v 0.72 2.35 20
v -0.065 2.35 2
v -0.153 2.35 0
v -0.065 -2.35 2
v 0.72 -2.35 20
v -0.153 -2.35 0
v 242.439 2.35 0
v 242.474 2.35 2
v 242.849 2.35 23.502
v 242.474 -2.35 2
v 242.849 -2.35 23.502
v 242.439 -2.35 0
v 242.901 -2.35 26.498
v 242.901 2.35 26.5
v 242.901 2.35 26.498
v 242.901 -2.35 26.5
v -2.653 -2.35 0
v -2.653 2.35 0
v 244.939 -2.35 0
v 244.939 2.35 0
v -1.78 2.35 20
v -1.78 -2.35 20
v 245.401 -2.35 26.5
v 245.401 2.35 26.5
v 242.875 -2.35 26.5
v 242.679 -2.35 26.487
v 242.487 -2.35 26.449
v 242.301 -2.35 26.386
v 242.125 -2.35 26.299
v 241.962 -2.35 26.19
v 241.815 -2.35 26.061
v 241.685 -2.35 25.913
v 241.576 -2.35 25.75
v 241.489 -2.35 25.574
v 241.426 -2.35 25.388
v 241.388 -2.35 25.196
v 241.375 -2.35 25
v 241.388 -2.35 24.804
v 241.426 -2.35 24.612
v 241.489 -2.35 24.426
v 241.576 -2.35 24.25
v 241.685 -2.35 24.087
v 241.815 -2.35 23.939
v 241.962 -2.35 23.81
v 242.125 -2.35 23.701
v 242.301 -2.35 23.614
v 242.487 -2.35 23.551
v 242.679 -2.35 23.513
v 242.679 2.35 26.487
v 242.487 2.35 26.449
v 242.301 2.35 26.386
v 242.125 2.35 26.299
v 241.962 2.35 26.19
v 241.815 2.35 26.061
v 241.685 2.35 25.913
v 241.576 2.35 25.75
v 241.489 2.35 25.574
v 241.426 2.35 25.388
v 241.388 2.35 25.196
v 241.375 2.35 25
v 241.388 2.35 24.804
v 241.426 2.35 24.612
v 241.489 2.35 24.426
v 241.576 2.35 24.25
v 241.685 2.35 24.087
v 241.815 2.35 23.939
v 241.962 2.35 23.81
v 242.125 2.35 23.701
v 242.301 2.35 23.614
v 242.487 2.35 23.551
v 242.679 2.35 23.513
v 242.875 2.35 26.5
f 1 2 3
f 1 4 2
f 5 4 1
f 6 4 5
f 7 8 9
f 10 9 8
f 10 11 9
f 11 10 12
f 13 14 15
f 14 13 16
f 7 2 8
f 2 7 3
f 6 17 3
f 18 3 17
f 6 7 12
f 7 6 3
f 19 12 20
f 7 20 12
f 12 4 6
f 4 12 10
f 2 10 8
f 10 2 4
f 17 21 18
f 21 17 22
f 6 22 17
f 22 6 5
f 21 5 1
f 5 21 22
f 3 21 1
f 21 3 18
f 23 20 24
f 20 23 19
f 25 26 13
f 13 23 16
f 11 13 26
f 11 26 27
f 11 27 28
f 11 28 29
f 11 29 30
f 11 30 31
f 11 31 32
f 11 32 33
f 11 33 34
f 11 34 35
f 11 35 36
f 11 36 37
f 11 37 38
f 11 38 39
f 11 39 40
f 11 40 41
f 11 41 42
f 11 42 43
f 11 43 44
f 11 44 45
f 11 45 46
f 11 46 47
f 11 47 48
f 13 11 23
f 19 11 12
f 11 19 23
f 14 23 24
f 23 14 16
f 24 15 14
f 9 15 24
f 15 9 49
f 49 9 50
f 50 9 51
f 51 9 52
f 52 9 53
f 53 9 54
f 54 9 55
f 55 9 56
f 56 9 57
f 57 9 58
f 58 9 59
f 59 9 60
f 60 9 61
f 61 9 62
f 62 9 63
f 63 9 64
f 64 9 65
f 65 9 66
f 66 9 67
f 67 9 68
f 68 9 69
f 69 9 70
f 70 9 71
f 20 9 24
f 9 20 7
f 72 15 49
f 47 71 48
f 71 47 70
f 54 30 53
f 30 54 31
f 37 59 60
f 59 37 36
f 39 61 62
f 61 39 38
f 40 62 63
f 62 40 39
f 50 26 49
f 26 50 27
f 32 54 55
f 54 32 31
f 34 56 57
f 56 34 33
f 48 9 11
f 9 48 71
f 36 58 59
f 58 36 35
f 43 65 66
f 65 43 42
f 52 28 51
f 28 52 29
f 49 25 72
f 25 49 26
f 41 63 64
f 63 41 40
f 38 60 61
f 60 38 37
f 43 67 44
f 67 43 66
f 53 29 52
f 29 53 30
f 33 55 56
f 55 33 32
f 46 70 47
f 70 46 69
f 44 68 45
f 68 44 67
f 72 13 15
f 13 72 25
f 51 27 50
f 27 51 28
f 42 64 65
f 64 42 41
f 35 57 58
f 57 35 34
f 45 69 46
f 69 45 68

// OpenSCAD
// Dozuki saw tooth cover: U-channel that presses onto the toothed edge from the side,
// capped at both ends. Inside: a wider channel at the bottom for the set teeth,
// and a thin slot above it that grips the blade body.
// The end caps lean to match the blade's end edges (/__/).
// Print on its closed bottom edge, opening up - no supports or bridges.

edge_len    = 241.5;   // blade's full bottom length, including the end diagonals
end_rise    = 1.5;     // the diagonals at each end of the edge rise this much
heel_lean   = 2.5;     // lean of the heel end edge, degrees from vertical - smaller is steeper
toe_lean    = 1;       // lean of the toe end edge, steeper than the heel (both lean the same way, /__/)
end_clear   = 0.5;     // gap between each blade end and its end cap
cover_h     = 18;      // MEASURE: how far up the blade it reaches (less than tooth tips to spine)
blade_t     = 0.3;     // blade body thickness
kerf        = 0.9;     // MEASURE: thickness across the set teeth
tooth_h     = 2;       // MEASURE: tooth height

body_gap    = 0.15;    // slot clearance on the blade body (small = more friction)
teeth_gap   = 0.6;     // clearance on the teeth
floor_t     = 2;       // wall under the tooth tips
wall        = 1.6;     // side wall thickness
end_wall    = 2.5;     // end caps at the heel and toe
end_caps    = true;    // false to see the profile from the end - set true before printing
tall_cap    = "toe";   // which end cap reaches further up the blade: "toe" or "heel"
tall_cap_h  = 21.5;    // how far up the blade the tall cap covers, from the cutting edge
hook_nub_r  = 1.5;     // MEASURE: rounded nub on top of the tall cap (above tall_cap_h), hooks
                       // into the notch in the blade's end edge - this is how far it sticks in
cutaway     = false;   // view only: one side wall removed - set false before printing

// blade mockup (view only - set show_blade false before exporting)
show_blade  = false;
heel_run    = 8;       // diagonal length at the heel end (x = 0 side), part of edge_len
toe_run     = 3;       // diagonal length at the toe end, part of edge_len
mock_h      = 45;      // MEASURE: blade height to draw

lead_in     = 0.8;     // chamfer on the slot lips so it pushes on easier
pinch_gap   = 0.2;     // gap between the pinch nubs: about the smallest a 0.4mm nozzle keeps
                       // open, and still under the blade so they grip it
pinch_h     = 1.2;     // height of the pinch nubs
pinch_land  = 0.4;     // flat on the nub tips - a sharp point is thinner than the nozzle
                       // line, so the slicer would drop it and leave a bigger gap

blade_len  = edge_len + 2*end_clear;   // inside length, measured where the blade's corners are
body_slot  = blade_t + body_gap;
teeth_slot = kerf + teeth_gap;
width      = teeth_slot + 2*wall;
height     = floor_t + cover_h;

// cross-section: x across the blade, y up from the bottom edge
module profile() {
    difference() {
        translate([-width/2, 0]) square([width, height]);
        translate([-teeth_slot/2, floor_t]) square([teeth_slot, tooth_h + 1]);
        translate([-body_slot/2, floor_t]) square([body_slot, cover_h + 1]);
        polygon([[-body_slot/2, height - 2], [-body_slot/2 - lead_in, height + 0.01],
                 [ body_slot/2 + lead_in, height + 0.01], [ body_slot/2, height - 2]]);
        // view only: drop the +x side wall to look inside
        if (cutaway) translate([body_slot/2 + 0.01, -1]) square([width, height + 2]);
    }
    // >< pinch nubs just under the chamfer, pointing in from both walls
    y0 = height - 2;
    for (s = [-1, 1])
        polygon([[s * (body_slot/2 + 0.01), y0],
                 [s * pinch_gap/2, y0 - (pinch_h - pinch_land)/2],
                 [s * pinch_gap/2, y0 - (pinch_h + pinch_land)/2],
                 [s * (body_slot/2 + 0.01), y0 - pinch_h]]);
}

// blade side view: x along the blade from its heel corner, y up from the cutting edge
module blade_outline() {
    rise = mock_h - end_rise;
    polygon([[heel_run, 0], [edge_len - toe_run, 0],
             [edge_len, end_rise], [edge_len + rise * tan(toe_lean), mock_h],
             [rise * tan(heel_lean), mock_h], [0, end_rise]]);
}

// blade standing in the slot, tooth edge on the floor, centred along the cover
if (show_blade)
    color("silver", 0.6)
        translate([(blade_len - edge_len) / 2, 0, floor_t])
            rotate([90, 0, 0]) linear_extrude(height = blade_t, center = true) blade_outline();

// --- cover, built in its own frame: x across, y up, z along the length ---

// lean a shape along the length by angle a, pivoting at the height of the blade's
// corners so the caps sit end_clear from them
module lean(a) {
    k = tan(a);
    y_ref = floor_t + end_rise;
    multmatrix([[1, 0, 0, 0], [0, 1, 0, 0], [0, k, 1, -k * y_ref]]) children();
}

// slab between a face at z0 leaning a0 and a face at z1 leaning a1,
// oversized across and up so it only trims the length
module span(z0, a0, z1, a1) {
    big = 1000;
    intersection() {
        lean(a0) translate([-width, -1, z0])       cube([2*width, big, big]);
        lean(a1) translate([-width, -1, z1 - big]) cube([2*width, big, big]);
    }
}

// channel profile run well past both ends, trimmed to length by span()
module run(z0, a0, z1, a1) {
    intersection() {
        translate([0, 0, -end_wall - 10]) linear_extrude(height = blade_len + 2*end_wall + 20)
            children();
        span(z0, a0, z1, a1);
    }
}

module floor_band() { translate([-width, -1]) square([2*width, floor_t + 1]); }

// length along x, opening facing up
rotate([90, 0, 90]) {
    // walls, then the floor under the teeth (red, preview only)
    run(0, heel_lean, blade_len, toe_lean) difference() { profile(); floor_band(); }
    run(0, heel_lean, blade_len, toe_lean) intersection() { profile(); floor_band(); }
    // end caps: full solid section, each leaning with its blade end edge
    tall = floor_t + tall_cap_h;
    tall_top = tall + 2*hook_nub_r;             // the tall cap carries on up to the nub's top
    if (end_caps) {
        run(-end_wall, heel_lean, 0, heel_lean)
            translate([-width/2, 0]) square([width, tall_cap == "heel" ? tall_top : height]);
        run(blade_len, toe_lean, blade_len + end_wall, toe_lean)
            translate([-width/2, 0]) square([width, tall_cap == "toe" ? tall_top : height]);
        // hook nub sitting on top of the tall cap (above tall_cap_h), on its inner face,
        // pointing at the blade
        y_n = tall + hook_nub_r;
        y_ref = floor_t + end_rise;
        z_n = tall_cap == "toe" ? blade_len + tan(toe_lean) * (y_n - y_ref)
                                : tan(heel_lean) * (y_n - y_ref);
        translate([0, y_n, z_n]) rotate([0, 90, 0])
            cylinder(r = hook_nub_r, h = width, center = true, $fn = 48);
    }
}
